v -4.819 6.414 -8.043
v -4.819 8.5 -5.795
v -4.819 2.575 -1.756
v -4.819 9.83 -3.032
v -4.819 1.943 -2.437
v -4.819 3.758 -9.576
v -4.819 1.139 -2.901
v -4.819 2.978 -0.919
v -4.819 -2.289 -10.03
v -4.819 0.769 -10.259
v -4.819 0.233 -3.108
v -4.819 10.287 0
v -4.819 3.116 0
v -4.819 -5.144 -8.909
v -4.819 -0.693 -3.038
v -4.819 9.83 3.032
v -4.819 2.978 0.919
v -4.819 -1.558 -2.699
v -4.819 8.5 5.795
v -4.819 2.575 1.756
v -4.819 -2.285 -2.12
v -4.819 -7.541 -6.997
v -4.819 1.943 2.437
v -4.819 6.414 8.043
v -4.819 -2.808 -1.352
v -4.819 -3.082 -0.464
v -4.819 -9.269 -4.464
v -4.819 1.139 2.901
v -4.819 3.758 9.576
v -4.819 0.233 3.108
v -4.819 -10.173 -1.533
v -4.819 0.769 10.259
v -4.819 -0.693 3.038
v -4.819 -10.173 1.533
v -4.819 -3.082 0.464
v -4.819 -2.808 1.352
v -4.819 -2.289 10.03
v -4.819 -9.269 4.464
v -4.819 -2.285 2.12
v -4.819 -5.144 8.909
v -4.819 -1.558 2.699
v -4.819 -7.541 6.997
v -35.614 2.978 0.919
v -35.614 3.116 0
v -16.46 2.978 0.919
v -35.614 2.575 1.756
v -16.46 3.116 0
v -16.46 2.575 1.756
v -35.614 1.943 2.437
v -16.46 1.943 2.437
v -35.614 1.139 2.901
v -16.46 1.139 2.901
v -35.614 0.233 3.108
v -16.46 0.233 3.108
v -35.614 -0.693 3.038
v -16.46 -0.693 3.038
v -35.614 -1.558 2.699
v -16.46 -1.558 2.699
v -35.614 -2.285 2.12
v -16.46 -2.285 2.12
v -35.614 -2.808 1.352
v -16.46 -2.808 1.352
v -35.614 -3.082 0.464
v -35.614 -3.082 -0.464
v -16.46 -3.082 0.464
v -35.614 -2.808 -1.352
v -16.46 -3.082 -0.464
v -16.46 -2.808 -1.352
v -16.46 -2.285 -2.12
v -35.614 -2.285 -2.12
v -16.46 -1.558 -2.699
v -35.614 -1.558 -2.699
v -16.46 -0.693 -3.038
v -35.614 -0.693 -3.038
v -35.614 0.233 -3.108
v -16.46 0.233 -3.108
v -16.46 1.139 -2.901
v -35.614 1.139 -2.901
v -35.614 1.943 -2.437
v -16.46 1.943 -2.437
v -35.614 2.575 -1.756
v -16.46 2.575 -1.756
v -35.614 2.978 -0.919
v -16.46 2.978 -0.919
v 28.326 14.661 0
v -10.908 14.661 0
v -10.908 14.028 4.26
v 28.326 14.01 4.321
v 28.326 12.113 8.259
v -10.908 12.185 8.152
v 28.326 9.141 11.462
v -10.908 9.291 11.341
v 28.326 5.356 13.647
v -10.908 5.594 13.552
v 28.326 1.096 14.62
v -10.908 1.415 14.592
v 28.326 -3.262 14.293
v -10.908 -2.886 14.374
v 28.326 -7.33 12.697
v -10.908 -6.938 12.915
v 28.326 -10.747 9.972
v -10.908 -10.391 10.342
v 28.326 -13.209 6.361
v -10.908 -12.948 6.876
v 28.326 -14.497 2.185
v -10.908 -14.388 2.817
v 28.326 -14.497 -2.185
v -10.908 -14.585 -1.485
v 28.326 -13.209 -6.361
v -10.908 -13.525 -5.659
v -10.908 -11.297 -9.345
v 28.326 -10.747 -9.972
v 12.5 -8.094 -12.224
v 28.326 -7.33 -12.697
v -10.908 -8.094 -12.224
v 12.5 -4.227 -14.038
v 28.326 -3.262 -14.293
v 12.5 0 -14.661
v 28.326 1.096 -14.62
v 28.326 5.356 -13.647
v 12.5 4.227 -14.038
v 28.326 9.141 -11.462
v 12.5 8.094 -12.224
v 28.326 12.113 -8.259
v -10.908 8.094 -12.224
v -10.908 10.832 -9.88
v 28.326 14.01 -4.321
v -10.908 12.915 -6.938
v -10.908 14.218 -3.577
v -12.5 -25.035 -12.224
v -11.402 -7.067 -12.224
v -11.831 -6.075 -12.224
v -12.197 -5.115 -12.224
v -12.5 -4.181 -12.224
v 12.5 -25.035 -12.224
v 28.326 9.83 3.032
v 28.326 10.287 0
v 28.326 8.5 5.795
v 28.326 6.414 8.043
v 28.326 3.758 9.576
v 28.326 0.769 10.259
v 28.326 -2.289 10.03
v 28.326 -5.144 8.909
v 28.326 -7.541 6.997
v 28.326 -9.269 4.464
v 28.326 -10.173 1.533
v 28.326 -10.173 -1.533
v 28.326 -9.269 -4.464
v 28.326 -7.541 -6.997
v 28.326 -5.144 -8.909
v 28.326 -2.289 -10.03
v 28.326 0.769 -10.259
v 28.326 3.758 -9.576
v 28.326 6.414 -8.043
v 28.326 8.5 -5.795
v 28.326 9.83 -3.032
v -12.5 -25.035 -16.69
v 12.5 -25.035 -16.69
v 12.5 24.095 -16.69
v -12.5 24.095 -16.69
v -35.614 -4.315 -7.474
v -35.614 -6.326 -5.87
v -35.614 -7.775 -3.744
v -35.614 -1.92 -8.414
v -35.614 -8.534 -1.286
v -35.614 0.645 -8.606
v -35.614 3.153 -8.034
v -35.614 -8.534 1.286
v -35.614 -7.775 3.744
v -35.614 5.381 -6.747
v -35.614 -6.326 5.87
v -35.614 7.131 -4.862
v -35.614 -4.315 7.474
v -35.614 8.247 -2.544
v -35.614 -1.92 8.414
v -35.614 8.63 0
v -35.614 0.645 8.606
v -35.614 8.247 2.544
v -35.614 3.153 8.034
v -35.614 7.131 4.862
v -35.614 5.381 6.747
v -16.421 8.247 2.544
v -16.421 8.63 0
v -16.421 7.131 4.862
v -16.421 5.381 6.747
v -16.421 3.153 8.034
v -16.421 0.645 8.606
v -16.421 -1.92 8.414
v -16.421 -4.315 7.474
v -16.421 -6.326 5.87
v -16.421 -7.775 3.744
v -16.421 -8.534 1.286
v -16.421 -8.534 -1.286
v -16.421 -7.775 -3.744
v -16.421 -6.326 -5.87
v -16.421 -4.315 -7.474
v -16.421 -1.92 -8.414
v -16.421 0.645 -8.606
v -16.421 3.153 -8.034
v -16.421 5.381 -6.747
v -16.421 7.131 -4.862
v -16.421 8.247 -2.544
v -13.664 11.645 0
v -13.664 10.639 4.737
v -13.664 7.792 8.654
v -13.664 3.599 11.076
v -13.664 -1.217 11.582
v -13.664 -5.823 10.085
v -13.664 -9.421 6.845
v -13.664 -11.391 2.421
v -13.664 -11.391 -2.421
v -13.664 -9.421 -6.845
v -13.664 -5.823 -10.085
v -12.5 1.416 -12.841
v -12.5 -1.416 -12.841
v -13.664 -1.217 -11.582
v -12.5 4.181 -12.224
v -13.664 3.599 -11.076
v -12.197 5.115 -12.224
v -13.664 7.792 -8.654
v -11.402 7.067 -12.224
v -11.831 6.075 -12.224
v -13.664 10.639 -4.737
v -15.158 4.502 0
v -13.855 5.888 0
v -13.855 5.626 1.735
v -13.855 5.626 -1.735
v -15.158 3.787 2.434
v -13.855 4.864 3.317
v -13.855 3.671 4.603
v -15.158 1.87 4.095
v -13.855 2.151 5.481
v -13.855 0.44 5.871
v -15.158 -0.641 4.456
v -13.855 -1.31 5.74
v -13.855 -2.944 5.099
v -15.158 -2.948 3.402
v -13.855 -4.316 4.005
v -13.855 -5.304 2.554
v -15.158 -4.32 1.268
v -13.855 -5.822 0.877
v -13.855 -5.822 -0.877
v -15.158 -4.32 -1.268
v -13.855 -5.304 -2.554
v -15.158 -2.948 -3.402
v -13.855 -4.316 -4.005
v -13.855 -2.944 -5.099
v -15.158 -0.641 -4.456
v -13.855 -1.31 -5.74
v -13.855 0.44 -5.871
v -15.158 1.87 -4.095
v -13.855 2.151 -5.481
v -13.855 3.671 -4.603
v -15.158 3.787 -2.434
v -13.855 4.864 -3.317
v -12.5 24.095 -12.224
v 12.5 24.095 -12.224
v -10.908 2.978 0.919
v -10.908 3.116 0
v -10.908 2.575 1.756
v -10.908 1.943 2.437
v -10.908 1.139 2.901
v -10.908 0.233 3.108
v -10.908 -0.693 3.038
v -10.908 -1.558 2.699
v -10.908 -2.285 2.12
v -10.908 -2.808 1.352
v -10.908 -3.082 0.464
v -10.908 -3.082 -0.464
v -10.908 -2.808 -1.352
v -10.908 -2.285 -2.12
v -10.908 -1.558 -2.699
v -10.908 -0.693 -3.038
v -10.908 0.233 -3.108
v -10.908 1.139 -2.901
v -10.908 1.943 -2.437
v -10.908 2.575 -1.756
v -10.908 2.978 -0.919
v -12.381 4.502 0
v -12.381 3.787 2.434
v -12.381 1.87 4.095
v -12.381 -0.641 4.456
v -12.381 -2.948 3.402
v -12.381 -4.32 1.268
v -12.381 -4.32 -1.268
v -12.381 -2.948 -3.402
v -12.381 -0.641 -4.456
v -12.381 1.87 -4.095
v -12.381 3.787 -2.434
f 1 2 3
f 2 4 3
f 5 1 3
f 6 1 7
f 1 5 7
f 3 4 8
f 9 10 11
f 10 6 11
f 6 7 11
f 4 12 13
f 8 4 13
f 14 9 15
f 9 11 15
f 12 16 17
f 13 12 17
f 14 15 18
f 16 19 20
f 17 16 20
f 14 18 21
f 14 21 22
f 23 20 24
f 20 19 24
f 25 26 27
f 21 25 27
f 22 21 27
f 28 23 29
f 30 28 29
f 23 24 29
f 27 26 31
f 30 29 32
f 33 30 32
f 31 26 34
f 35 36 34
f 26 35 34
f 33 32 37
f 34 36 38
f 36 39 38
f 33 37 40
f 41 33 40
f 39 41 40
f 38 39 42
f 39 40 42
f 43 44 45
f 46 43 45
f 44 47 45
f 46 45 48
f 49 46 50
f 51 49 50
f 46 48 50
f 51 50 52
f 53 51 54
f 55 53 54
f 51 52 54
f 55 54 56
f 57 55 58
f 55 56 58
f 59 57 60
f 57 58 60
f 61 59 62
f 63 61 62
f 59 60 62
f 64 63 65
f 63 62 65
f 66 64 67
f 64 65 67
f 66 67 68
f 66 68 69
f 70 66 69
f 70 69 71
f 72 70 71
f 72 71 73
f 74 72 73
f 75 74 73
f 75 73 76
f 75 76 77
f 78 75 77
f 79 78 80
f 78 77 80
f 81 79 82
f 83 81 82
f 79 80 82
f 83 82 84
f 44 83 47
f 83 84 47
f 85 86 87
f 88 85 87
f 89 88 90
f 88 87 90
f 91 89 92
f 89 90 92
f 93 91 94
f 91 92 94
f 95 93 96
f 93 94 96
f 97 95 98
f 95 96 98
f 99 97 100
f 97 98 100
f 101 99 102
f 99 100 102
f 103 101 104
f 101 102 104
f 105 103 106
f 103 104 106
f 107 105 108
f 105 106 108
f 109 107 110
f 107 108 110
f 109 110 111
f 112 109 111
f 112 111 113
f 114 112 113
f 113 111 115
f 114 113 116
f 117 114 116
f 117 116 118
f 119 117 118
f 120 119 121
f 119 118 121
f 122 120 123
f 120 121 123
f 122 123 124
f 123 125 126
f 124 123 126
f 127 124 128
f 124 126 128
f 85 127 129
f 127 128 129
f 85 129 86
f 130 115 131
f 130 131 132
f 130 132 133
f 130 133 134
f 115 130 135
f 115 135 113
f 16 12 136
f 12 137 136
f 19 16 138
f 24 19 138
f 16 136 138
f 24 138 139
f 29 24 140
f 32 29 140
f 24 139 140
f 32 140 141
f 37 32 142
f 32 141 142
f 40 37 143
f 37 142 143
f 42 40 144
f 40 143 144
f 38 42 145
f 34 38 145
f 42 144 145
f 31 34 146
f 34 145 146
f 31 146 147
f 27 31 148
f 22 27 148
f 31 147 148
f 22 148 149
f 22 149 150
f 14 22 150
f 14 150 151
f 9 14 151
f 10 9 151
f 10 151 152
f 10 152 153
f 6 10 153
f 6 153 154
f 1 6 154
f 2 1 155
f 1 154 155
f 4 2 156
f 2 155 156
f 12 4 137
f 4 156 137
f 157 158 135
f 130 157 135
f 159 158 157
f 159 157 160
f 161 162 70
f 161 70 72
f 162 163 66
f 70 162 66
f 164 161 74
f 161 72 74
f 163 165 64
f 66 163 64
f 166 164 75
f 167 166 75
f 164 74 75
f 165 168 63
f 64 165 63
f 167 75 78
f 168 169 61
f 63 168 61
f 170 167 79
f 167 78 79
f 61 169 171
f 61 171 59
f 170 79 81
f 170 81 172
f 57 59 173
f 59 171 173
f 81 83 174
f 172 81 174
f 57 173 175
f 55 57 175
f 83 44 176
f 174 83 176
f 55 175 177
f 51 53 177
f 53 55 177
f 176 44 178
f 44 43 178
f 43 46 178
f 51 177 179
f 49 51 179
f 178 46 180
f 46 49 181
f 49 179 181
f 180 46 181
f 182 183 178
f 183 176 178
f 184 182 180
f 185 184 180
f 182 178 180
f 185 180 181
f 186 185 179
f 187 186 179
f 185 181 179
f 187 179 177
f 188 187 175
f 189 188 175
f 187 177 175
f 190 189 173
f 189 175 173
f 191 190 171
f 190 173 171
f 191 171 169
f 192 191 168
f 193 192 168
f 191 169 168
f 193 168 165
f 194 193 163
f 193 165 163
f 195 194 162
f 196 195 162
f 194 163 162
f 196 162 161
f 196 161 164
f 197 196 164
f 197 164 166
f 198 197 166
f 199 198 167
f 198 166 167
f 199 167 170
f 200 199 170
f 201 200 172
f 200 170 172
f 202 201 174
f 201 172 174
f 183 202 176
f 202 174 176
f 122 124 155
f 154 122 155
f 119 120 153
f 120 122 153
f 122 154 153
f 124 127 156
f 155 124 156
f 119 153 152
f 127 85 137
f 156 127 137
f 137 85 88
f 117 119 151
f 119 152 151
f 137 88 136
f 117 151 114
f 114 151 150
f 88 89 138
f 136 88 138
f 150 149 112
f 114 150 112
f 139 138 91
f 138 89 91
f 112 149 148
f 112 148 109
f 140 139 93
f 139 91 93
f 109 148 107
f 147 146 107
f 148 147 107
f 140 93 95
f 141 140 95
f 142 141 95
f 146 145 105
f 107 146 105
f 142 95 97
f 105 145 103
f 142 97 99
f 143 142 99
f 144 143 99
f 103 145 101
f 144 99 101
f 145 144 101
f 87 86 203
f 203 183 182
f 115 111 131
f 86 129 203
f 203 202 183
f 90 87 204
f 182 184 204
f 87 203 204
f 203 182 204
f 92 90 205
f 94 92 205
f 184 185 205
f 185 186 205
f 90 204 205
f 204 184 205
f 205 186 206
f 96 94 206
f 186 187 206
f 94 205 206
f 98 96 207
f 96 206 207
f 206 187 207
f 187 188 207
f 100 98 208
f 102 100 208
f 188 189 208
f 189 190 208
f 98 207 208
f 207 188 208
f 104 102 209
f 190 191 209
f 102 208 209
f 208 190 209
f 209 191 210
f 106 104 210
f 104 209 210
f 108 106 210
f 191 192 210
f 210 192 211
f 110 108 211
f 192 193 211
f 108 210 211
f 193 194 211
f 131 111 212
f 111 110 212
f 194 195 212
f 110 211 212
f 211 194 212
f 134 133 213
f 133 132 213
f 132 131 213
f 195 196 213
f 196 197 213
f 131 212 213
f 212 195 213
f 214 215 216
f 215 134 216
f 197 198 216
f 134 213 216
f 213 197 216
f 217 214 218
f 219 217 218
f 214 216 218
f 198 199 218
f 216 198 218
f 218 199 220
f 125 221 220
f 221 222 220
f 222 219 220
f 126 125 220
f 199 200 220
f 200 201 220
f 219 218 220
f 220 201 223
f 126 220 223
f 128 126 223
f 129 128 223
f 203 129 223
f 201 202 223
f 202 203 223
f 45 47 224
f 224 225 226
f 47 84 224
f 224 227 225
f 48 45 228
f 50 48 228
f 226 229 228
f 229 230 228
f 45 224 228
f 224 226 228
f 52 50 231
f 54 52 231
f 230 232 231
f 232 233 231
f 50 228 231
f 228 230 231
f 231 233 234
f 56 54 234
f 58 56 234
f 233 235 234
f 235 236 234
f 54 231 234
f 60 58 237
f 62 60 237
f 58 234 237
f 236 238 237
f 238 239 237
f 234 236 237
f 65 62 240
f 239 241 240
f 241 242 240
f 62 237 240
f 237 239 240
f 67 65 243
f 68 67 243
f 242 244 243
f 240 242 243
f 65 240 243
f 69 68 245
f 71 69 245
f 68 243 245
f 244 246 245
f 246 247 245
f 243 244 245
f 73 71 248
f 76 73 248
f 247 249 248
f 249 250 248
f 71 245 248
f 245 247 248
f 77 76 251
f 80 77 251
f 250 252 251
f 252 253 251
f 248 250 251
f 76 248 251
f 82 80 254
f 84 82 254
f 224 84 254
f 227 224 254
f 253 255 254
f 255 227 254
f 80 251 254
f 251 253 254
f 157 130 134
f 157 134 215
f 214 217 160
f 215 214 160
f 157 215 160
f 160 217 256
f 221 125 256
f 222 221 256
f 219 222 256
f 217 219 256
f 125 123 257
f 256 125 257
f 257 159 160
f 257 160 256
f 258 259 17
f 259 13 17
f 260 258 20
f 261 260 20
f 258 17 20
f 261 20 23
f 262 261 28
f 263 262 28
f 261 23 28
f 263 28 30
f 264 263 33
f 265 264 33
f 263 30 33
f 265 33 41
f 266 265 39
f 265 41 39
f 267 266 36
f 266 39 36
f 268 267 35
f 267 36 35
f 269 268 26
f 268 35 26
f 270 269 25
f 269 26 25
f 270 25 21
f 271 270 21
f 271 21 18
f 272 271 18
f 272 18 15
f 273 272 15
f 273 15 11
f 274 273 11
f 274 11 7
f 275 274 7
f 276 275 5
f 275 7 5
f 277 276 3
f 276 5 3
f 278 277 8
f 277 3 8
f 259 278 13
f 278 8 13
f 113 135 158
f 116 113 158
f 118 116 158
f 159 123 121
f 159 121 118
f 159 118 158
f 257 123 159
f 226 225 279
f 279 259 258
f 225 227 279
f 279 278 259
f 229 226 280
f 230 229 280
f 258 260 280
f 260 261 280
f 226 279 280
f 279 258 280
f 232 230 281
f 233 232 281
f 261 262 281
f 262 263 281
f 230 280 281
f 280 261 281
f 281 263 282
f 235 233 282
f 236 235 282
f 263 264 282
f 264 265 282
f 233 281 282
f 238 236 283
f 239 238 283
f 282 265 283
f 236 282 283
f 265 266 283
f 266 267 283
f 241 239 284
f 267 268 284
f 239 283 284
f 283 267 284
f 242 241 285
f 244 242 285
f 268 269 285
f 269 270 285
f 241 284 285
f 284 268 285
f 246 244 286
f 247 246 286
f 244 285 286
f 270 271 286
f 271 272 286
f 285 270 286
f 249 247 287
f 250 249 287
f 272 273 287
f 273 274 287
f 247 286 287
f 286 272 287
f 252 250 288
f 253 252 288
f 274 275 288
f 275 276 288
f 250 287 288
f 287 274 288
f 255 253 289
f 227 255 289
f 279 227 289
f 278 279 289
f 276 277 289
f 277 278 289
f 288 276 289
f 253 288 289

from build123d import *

# Parameters (mm, degrees)
F2_W     = 49.1305962205
F2_H     = 4.4664181769
F3_DEPTH = 12.5


# Not quite as in the source:
# - a feature names something its author has since deleted; it is built from what else it names


with BuildPart() as f1:
    # F0 (on Top) → F1 (revolve)
    with BuildSketch(Plane.XY):
        Polygon((-35.6138087809, 8.6301378906), (-35.6138087809, 3.1164383981), (-16.4602123841, 3.1164383981), (-13.8548975913, 5.887503858), (-10.9075363725, 3.1164383981), (-4.8190304078, 3.1164383981), (-4.8190304078, 10.2874673903), (28.3264927566, 10.2874673903), (28.3264927566, 14.6608594805), (-10.9075363725, 14.6608594805), (-16.4212342352, 8.6301378906), align=None)
    revolve(axis=Axis((-1.5279836953, 0, 0), (1, 0, 0)))

    # F2 (on Right) → F3 (join, symmetric)
    with BuildSketch(Plane.YZ):
        with Locations((-0.4701502621, -14.4570898265)):
            Rectangle(F2_W, F2_H)
    extrude(amount=F3_DEPTH, both=True)


solid = f1.part
